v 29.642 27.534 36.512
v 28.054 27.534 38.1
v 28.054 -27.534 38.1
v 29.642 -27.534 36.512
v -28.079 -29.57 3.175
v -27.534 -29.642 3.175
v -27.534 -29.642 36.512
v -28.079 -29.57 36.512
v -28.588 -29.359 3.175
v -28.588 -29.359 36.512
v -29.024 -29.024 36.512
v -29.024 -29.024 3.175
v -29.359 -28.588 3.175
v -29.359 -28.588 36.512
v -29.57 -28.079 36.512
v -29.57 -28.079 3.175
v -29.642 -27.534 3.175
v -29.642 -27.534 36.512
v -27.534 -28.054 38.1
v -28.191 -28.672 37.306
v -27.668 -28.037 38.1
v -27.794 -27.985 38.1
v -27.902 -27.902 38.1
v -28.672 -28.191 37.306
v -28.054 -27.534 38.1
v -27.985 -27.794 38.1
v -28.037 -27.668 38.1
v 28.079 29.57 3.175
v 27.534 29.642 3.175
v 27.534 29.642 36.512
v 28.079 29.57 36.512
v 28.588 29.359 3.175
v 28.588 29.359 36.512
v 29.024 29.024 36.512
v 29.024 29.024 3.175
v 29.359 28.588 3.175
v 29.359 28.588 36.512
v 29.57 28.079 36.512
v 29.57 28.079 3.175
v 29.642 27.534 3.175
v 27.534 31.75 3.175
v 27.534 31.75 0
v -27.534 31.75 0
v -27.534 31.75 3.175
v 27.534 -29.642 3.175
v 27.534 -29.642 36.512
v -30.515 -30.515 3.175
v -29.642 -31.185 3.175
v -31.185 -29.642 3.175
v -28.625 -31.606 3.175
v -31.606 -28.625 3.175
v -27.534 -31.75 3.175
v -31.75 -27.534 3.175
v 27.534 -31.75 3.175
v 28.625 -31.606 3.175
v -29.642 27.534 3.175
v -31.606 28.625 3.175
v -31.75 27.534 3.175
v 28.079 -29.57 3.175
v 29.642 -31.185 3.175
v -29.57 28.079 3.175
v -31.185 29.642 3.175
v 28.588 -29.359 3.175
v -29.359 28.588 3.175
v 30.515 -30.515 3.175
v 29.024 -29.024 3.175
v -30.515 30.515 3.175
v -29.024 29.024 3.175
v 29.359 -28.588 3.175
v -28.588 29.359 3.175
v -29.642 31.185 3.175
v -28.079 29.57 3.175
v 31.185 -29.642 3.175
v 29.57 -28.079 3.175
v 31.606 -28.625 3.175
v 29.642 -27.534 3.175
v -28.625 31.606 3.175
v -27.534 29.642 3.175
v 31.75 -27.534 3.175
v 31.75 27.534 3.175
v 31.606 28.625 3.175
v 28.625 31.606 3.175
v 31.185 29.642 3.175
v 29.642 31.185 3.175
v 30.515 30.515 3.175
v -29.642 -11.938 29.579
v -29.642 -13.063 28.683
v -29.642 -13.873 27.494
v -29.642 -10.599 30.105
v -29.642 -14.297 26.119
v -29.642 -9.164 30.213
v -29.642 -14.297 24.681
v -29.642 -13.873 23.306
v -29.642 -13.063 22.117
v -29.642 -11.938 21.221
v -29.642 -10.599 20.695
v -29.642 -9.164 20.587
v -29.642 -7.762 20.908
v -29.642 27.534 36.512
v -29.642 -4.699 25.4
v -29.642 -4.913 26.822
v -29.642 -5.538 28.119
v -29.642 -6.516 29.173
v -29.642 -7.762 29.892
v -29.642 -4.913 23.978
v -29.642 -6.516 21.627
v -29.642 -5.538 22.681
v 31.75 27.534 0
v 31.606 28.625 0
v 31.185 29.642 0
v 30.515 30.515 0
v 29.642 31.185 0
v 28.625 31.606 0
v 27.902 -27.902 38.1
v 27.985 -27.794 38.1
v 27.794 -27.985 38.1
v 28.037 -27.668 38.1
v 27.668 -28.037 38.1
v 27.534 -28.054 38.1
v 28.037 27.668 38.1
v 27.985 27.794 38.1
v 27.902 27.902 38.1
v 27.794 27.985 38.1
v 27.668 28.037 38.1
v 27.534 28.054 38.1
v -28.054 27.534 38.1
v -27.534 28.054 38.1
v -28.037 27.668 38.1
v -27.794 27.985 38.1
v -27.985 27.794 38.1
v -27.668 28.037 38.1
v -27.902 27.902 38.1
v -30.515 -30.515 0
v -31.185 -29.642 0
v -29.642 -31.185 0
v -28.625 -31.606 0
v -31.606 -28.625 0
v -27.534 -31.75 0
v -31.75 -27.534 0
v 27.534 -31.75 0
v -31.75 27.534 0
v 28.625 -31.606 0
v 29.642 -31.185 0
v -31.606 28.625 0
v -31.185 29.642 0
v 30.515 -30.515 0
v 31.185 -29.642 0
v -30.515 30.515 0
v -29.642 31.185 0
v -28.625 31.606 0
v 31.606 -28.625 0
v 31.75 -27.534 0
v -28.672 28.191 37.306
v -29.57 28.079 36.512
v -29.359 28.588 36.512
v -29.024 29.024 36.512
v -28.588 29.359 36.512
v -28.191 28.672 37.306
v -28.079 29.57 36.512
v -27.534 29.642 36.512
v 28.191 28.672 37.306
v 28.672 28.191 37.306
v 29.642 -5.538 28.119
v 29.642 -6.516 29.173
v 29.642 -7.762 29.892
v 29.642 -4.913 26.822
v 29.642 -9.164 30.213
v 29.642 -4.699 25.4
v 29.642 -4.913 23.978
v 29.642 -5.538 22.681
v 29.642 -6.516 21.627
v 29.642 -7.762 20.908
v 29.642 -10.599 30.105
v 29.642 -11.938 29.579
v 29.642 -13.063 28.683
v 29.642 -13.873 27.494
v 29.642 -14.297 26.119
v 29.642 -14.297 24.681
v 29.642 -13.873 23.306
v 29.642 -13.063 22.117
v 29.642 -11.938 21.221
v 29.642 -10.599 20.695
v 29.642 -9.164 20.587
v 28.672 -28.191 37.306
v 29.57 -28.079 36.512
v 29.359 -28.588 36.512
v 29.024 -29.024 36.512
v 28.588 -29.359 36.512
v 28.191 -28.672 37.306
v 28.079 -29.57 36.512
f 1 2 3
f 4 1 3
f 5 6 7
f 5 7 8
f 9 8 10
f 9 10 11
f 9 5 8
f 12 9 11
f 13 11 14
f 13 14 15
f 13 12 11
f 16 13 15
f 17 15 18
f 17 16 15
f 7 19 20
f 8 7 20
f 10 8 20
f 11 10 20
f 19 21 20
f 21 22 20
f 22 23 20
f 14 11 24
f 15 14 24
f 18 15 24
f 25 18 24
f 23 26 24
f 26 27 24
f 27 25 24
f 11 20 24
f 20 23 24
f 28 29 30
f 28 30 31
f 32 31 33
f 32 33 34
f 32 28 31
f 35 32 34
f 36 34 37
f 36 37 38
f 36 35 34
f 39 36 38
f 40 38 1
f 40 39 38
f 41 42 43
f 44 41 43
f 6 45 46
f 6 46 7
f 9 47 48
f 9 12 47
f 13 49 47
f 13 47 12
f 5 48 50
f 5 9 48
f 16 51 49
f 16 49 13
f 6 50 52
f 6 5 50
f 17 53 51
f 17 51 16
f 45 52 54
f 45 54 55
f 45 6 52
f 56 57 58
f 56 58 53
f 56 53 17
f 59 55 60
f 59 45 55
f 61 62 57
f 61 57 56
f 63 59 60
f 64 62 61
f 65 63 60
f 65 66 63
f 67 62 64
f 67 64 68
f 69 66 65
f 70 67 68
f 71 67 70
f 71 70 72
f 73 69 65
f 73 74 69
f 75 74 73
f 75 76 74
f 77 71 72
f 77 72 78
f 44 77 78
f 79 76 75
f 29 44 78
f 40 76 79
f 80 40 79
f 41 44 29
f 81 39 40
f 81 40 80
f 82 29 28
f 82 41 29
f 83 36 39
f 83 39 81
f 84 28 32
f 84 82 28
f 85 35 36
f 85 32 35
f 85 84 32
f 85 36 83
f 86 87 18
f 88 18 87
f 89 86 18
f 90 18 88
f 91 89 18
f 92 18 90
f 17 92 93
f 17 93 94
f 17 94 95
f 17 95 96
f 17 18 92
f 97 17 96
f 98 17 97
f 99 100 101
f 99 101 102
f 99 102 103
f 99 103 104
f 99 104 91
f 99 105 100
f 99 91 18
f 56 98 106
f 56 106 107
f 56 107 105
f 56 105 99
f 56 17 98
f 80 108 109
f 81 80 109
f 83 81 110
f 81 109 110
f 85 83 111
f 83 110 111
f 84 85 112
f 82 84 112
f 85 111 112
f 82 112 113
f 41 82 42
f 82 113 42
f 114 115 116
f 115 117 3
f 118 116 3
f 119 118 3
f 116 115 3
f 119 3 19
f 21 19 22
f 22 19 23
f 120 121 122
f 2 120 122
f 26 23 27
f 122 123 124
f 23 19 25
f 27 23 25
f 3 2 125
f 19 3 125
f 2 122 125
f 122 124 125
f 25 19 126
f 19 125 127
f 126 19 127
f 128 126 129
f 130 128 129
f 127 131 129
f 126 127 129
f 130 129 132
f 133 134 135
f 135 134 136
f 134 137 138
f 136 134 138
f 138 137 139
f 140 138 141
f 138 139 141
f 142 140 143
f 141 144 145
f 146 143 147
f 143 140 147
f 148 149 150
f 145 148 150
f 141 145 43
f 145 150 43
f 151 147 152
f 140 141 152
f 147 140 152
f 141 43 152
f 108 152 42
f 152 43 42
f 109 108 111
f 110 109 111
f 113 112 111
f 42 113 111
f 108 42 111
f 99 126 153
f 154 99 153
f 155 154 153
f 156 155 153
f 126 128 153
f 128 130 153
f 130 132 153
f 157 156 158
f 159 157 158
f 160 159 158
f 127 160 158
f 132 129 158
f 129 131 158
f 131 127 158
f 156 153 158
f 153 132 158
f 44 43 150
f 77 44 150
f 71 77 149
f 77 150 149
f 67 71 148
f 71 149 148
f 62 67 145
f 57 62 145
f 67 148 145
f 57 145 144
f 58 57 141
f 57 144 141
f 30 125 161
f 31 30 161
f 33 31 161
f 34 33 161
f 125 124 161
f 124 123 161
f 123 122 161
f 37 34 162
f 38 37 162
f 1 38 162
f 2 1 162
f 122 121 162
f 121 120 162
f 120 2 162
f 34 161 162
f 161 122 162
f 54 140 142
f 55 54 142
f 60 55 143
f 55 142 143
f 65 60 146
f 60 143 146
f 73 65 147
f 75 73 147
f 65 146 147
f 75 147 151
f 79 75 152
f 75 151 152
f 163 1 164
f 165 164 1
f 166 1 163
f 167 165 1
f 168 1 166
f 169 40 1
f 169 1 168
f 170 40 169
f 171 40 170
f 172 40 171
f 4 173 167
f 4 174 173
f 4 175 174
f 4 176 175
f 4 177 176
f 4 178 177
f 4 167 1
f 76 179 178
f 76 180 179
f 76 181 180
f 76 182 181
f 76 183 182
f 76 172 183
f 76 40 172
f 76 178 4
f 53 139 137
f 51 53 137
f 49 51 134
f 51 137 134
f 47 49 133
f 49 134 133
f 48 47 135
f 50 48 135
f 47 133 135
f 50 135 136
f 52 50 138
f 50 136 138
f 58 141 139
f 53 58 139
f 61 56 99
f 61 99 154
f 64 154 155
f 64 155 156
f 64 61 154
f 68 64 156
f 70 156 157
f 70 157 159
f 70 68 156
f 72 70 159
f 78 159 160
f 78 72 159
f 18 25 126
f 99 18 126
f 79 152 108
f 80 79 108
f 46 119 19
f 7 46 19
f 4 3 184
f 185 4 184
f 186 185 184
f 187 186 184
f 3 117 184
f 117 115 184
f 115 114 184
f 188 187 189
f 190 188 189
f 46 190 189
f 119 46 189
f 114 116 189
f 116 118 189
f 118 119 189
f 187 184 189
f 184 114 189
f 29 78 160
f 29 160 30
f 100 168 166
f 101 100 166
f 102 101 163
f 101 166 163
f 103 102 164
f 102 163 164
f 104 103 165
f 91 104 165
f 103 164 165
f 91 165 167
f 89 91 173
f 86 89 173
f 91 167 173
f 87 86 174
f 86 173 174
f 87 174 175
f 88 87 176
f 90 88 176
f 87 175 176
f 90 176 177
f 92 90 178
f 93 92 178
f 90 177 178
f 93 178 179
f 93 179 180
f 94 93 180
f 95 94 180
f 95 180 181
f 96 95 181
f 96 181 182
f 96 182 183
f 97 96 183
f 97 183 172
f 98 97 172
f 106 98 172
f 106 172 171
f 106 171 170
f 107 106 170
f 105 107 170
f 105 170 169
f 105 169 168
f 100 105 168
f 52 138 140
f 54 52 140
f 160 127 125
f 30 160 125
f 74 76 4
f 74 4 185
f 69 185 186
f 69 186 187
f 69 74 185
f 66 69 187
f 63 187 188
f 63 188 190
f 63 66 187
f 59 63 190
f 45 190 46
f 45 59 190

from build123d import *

# Parameters (mm, degrees)
BOSS_EXTRUDE1_DEPTH = 38.1
BOSS_EXTRUDE2_DEPTH = 3.175
SKETCH2_R           = 4.826
CUT_EXTRUDE1_DEPTH  = 79.921642198
CHAMFER1_SIZE       = 1.5875


with BuildPart() as part:
    # Sketch1 → Boss-Extrude1 (new body)
    with BuildSketch(Plane.XY):
        with BuildLine():
            ThreePointArc((29.6418, 27.5336), (29.024322516, 29.024322516), (27.5336, 29.6418))
            Line((27.5336, 29.6418), (-27.5336, 29.6418))
            ThreePointArc((-27.5336, 29.6418), (-29.024322516, 29.024322516), (-29.6418, 27.5336))
            Line((-29.6418, 27.5336), (-29.6418, -27.5336))
            ThreePointArc((-29.6418, -27.5336), (-29.024322516, -29.024322516), (-27.5336, -29.6418))
            Line((-27.5336, -29.6418), (27.5336, -29.6418))
            ThreePointArc((27.5336, -29.6418), (29.024322516, -29.024322516), (29.6418, -27.5336))
            Line((29.6418, -27.5336), (29.6418, 27.5336))
        make_face()
    extrude(amount=BOSS_EXTRUDE1_DEPTH)

    # Sketch1<3> → Boss-Extrude2 (add)
    with BuildSketch(Plane.XY):
        with BuildLine():
            Line((27.5336, 31.75), (-27.5336, 31.75))
            ThreePointArc((-27.5336, 31.75), (-30.515045032, 30.515045032), (-31.75, 27.5336))
            Line((-31.75, 27.5336), (-31.75, -27.5336))
            ThreePointArc((-31.75, -27.5336), (-30.515045032, -30.515045032), (-27.5336, -31.75))
            Line((-27.5336, -31.75), (27.5336, -31.75))
            ThreePointArc((27.5336, -31.75), (30.515045032, -30.515045032), (31.75, -27.5336))
            Line((31.75, -27.5336), (31.75, 27.5336))
            ThreePointArc((31.75, 27.5336), (30.515045032, 30.515045032), (27.5336, 31.75))
        make_face()
        with BuildLine():
            Line((27.5336, 29.6418), (-27.5336, 29.6418))
            ThreePointArc((-27.5336, 29.6418), (-29.024322516, 29.024322516), (-29.6418, 27.5336))
            Line((-29.6418, 27.5336), (-29.6418, -27.5336))
            ThreePointArc((-29.6418, -27.5336), (-29.024322516, -29.024322516), (-27.5336, -29.6418))
            Line((-27.5336, -29.6418), (27.5336, -29.6418))
            ThreePointArc((27.5336, -29.6418), (29.024322516, -29.024322516), (29.6418, -27.5336))
            Line((29.6418, -27.5336), (29.6418, 27.5336))
            ThreePointArc((29.6418, 27.5336), (29.024322516, 29.024322516), (27.5336, 29.6418))
        make_face(mode=Mode.SUBTRACT)
    extrude(amount=BOSS_EXTRUDE2_DEPTH)

    # Sketch2 → Cut-Extrude1 (cut, through all)
    with BuildSketch(Plane(origin=(29.6418, 0, 0), x_dir=(0, 0, -1), z_dir=(1, 0, 0))):
        with Locations((-25.4, -9.525)):
            Circle(SKETCH2_R)
    extrude(amount=-CUT_EXTRUDE1_DEPTH, mode=Mode.SUBTRACT)

    # Chamfer1
    chamfer1_edges = [part.edges().sort_by_distance(p)[0] for p in [
        (0, 29.6418, 38.1),
        (29.024322516, 29.024322516, 38.1),
        (-29.024322516, 29.024322516, 38.1),
        (29.6418, 0, 38.1),
        (-29.6418, 0, 38.1),
        (29.024322516, -29.024322516, 38.1),
        (-29.024322516, -29.024322516, 38.1),
        (0, -29.6418, 38.1),
    ]]
    chamfer(chamfer1_edges, length=CHAMFER1_SIZE)


solid = part.part
